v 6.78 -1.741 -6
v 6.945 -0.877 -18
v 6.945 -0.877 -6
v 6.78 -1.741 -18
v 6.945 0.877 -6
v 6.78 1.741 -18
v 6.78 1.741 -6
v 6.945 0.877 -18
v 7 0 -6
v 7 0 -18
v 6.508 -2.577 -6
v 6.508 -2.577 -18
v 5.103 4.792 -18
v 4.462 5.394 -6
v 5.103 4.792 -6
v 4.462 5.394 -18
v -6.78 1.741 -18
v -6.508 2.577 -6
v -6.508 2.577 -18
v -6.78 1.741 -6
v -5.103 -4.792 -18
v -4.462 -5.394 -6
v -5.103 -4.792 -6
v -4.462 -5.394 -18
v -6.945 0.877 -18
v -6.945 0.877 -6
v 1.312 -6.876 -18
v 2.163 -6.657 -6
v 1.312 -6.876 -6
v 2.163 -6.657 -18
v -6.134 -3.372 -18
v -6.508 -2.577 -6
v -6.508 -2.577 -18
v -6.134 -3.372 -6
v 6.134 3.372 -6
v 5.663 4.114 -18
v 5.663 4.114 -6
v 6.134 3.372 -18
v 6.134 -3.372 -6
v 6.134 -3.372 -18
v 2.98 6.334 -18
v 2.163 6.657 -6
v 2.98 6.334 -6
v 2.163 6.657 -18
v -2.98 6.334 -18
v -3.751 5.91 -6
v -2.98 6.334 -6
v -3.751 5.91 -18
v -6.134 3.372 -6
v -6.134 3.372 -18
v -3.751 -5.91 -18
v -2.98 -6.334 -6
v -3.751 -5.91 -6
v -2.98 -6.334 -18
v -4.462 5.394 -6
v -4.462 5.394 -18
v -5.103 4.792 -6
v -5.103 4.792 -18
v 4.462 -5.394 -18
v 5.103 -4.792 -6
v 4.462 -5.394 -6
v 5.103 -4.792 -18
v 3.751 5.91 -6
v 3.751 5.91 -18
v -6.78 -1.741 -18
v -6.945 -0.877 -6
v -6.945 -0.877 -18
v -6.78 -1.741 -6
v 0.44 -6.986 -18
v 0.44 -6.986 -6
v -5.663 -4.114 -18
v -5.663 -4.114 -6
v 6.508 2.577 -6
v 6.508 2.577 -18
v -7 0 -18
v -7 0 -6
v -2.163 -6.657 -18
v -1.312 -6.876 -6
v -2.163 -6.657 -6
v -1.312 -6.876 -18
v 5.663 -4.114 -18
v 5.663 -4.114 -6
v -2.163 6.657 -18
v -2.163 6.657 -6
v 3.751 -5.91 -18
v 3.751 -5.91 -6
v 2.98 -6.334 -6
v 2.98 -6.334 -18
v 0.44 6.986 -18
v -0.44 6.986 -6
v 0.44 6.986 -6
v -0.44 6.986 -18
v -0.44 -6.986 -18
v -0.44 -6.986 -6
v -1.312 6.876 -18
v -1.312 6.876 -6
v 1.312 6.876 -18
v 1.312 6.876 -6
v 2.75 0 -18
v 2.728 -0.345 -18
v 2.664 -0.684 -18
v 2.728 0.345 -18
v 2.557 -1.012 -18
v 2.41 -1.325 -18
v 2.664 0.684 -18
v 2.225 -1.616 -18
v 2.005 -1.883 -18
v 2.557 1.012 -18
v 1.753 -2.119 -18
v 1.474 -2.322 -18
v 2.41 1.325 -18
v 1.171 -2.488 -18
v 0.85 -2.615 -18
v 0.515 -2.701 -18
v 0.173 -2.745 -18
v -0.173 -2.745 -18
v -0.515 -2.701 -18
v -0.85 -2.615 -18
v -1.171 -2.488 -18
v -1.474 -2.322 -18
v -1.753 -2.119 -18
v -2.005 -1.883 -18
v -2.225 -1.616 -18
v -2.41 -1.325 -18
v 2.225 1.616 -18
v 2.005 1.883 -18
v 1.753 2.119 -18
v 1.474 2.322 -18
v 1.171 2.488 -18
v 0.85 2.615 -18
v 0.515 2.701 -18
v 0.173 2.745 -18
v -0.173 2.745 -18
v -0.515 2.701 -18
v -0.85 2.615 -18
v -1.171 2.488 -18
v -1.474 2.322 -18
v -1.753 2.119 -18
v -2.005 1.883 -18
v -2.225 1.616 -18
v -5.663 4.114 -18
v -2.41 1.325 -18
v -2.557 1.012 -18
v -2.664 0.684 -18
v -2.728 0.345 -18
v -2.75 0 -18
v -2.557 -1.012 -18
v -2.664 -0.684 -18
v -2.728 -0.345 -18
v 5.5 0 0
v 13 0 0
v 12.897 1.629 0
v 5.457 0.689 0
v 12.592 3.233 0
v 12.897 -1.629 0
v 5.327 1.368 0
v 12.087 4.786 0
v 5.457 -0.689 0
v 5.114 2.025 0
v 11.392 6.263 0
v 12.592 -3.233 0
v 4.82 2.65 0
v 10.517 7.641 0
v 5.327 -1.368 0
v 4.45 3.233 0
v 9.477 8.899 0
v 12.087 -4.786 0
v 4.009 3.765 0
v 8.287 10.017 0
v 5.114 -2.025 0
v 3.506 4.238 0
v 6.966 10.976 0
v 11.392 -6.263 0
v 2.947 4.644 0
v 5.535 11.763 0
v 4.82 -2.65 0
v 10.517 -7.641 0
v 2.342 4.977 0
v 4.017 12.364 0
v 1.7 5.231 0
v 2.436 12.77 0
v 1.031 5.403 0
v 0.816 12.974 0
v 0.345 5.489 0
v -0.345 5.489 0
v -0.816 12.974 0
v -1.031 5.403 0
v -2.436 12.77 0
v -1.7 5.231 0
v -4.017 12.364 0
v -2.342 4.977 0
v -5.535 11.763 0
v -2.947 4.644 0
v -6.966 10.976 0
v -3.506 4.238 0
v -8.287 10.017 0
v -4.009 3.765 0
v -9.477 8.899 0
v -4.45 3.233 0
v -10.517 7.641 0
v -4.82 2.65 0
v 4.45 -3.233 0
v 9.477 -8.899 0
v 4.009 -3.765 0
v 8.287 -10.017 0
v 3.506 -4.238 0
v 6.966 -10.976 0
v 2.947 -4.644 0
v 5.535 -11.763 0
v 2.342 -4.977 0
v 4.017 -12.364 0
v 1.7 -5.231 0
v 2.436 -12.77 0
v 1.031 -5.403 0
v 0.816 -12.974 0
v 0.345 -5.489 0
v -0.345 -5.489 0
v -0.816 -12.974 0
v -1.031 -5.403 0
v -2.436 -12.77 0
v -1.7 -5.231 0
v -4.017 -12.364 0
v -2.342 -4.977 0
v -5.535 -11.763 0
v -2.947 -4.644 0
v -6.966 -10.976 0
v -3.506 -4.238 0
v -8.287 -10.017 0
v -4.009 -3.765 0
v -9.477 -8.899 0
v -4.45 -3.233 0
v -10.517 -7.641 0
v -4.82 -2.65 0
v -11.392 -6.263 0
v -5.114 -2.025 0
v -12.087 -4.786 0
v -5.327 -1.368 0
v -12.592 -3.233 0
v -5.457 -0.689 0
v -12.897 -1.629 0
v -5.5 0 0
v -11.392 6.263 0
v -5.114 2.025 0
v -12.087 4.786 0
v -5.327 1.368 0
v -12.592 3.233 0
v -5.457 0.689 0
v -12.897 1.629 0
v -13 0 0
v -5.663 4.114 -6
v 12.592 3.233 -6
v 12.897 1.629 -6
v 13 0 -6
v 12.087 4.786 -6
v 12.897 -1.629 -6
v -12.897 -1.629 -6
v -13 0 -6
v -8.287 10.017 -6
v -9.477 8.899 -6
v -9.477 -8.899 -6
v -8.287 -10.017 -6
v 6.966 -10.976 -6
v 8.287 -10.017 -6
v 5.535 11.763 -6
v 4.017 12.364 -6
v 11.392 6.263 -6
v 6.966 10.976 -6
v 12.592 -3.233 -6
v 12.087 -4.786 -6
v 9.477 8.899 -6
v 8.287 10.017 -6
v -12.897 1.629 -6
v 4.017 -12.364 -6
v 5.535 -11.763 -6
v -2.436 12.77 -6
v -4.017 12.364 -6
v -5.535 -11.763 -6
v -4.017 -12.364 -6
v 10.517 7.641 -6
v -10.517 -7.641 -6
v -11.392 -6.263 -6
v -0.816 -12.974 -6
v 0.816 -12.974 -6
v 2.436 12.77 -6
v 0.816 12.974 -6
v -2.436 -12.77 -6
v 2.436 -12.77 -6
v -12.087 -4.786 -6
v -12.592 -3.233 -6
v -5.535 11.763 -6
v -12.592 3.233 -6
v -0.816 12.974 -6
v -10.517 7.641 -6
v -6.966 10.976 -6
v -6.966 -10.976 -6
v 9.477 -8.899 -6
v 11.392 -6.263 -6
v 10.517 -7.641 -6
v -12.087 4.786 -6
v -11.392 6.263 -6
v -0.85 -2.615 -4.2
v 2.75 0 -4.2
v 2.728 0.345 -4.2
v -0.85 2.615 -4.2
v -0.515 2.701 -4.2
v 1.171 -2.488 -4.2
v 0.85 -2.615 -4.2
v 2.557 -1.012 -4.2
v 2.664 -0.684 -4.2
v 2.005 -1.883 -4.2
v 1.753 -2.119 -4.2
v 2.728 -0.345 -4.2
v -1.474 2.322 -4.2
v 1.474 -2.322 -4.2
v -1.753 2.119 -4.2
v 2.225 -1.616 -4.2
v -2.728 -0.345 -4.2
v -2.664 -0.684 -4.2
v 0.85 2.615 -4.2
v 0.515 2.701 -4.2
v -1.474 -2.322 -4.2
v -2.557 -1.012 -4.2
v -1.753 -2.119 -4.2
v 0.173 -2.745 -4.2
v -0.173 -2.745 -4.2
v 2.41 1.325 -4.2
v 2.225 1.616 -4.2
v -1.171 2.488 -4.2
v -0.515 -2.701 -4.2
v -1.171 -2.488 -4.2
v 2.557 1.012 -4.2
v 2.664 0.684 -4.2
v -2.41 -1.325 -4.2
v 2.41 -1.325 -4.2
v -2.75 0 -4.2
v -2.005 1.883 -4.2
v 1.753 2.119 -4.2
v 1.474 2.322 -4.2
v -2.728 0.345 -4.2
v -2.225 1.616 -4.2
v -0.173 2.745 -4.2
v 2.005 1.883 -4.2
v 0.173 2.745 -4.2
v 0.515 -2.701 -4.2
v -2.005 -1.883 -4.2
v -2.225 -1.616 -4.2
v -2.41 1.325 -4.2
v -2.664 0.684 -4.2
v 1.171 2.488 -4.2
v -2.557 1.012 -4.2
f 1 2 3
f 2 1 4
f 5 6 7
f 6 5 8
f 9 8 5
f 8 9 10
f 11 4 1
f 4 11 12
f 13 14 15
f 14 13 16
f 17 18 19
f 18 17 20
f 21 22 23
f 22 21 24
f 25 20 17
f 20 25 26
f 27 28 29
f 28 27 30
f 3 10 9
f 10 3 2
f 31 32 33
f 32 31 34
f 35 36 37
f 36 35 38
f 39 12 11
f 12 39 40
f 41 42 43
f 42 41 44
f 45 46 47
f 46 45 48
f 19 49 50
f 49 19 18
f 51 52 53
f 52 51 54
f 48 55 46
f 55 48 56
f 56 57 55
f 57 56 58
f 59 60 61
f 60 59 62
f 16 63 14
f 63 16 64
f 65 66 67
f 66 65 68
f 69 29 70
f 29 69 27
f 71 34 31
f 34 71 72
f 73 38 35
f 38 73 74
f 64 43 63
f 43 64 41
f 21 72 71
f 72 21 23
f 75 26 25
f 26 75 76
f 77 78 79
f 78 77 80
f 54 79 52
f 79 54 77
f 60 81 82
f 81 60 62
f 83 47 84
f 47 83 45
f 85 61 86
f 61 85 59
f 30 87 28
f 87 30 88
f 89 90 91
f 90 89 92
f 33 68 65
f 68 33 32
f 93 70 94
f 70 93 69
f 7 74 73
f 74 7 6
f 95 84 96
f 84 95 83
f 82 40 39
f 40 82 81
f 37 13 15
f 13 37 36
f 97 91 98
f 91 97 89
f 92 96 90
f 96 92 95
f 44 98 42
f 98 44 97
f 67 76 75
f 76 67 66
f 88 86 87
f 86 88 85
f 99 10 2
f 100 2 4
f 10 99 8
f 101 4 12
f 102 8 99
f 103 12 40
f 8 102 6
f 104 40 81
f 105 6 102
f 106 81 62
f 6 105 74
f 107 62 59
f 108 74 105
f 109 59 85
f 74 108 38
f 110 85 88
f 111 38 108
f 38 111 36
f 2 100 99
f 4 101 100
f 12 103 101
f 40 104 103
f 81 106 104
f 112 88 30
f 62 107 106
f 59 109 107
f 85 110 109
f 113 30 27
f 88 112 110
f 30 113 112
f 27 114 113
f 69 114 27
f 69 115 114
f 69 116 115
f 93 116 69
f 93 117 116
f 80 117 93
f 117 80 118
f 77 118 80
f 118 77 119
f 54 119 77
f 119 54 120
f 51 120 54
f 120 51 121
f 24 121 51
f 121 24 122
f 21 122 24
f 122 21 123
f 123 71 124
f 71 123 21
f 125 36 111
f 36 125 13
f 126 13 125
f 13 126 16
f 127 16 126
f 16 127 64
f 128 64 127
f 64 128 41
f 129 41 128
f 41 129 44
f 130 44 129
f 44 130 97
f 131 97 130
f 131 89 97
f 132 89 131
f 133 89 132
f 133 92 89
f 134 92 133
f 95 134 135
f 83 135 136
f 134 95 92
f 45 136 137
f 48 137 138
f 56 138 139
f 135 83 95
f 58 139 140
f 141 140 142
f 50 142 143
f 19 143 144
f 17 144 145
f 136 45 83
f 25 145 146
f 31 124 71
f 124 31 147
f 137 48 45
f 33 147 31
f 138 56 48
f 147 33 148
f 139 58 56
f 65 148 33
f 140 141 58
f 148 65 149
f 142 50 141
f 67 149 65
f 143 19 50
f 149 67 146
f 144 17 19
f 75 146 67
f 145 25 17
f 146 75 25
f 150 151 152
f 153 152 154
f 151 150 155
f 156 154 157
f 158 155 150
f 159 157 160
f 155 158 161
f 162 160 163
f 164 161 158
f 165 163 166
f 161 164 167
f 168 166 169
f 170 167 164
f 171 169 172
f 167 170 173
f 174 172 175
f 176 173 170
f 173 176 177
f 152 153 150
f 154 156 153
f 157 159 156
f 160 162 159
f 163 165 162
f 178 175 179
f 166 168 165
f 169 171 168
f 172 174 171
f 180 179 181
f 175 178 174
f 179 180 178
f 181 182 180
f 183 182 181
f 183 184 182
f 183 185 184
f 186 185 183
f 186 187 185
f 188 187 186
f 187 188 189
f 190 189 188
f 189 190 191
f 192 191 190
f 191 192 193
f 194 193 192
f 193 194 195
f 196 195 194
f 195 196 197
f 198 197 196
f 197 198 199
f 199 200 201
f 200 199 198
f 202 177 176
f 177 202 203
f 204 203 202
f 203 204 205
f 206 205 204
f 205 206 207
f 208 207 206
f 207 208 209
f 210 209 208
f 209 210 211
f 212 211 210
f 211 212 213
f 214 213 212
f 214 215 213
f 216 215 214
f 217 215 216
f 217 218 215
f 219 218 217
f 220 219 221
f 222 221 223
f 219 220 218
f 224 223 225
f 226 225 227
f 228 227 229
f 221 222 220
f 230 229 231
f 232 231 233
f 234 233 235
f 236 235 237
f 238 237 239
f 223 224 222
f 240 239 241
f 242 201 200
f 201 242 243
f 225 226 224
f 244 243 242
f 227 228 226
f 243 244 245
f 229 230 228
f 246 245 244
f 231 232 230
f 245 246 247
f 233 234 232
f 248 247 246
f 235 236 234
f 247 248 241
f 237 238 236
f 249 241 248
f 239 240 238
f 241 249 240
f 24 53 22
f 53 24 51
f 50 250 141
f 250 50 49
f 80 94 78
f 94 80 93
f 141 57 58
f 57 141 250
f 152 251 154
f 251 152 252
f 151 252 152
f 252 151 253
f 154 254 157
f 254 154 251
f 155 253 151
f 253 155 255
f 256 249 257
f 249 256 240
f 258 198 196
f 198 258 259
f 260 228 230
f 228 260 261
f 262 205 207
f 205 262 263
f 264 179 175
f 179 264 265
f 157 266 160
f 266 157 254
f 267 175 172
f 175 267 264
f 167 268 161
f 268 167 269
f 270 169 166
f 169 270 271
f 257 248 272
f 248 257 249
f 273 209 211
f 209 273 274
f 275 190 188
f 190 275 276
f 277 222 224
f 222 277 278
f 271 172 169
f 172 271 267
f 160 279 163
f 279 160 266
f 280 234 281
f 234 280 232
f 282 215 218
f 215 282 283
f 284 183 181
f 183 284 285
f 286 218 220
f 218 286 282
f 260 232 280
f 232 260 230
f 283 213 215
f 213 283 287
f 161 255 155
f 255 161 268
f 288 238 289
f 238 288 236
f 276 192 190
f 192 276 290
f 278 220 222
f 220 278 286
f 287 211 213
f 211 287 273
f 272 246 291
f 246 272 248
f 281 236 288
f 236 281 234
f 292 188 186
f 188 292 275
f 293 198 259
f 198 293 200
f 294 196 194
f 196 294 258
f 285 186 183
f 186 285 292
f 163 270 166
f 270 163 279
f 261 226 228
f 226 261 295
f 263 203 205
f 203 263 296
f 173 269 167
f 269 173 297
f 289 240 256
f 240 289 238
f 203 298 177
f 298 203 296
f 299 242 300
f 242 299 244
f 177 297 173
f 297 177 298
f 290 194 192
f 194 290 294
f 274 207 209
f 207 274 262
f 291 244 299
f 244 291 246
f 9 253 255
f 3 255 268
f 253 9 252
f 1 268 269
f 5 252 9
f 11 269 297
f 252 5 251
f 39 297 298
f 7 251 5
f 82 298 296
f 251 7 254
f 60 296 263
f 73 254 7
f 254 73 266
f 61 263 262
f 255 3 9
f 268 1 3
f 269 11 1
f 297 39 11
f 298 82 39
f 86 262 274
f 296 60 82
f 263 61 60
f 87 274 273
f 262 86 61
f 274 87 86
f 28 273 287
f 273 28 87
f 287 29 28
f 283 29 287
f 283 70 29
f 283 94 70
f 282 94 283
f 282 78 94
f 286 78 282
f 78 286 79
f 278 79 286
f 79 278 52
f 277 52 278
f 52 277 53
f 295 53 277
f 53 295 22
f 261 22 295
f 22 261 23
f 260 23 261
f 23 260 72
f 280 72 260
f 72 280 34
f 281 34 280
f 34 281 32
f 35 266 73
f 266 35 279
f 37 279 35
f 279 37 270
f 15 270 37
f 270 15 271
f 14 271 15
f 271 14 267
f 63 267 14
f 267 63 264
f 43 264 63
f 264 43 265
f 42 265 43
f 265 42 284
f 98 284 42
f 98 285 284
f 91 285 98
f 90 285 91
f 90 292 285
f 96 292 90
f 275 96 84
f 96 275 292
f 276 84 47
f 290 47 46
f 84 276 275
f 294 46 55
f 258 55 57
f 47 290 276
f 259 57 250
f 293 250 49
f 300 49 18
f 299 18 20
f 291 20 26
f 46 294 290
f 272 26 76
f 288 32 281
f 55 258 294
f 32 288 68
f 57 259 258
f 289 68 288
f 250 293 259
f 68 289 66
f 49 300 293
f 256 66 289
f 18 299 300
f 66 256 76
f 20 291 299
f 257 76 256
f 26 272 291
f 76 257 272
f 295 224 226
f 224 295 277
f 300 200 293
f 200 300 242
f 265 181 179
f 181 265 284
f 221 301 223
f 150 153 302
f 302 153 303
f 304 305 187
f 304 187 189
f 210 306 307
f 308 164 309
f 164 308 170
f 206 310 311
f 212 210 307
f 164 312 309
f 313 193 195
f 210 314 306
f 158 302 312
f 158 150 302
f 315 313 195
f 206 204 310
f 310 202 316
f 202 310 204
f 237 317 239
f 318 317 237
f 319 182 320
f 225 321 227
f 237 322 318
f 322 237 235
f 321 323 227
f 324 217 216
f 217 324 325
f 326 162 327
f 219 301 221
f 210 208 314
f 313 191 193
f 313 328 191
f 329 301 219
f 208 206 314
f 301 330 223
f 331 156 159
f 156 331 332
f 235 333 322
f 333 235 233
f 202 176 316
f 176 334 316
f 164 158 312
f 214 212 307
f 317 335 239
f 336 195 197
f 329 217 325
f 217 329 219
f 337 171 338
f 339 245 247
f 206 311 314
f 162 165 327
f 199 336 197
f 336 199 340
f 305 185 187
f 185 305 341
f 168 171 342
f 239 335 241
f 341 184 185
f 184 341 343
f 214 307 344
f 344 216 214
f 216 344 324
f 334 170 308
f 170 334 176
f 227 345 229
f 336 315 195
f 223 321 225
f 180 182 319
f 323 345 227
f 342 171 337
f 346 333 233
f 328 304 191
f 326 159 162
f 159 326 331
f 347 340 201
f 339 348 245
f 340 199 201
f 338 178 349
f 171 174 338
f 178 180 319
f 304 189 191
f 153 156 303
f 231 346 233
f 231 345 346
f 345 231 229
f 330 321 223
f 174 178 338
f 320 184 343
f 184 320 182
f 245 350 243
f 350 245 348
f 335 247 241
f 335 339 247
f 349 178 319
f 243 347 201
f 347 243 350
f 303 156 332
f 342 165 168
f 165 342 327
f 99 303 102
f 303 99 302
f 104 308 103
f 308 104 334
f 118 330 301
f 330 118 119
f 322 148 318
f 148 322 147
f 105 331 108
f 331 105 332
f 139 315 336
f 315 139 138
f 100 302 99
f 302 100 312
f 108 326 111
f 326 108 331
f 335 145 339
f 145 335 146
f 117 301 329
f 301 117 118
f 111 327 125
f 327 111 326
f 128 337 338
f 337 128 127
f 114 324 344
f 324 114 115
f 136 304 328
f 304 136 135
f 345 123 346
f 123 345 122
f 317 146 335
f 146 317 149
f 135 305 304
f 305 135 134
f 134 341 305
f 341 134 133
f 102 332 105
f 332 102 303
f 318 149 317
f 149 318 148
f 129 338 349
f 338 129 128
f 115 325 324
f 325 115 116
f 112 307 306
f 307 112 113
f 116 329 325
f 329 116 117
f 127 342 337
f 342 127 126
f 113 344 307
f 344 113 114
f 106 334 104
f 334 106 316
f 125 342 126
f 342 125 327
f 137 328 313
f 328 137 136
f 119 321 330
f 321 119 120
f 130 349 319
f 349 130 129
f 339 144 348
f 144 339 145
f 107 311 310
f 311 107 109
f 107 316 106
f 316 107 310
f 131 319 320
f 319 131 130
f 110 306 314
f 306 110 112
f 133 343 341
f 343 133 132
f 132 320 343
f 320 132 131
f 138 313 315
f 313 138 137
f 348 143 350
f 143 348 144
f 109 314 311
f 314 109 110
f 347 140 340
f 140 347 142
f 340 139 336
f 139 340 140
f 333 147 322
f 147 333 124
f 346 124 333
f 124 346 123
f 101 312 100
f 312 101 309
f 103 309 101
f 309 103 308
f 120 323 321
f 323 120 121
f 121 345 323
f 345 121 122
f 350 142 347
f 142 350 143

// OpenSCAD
$fn = 50;


difference() {
	union() {
		translate(v = [0, 0, -18.0000000000]) {
			cylinder(h = 18, r = 7.0000000000);
		}
		translate(v = [0, 0, -6.0000000000]) {
			cylinder(h = 6, r = 13.0000000000);
		}
	}
	union() {
		translate(v = [0, 0, 0]) {
			rotate(a = [0, 0, 0]) {
				difference() {
					union() {
						#translate(v = [0, 0, -18.0000000000]) {
							cylinder(h = 18, r = 2.2500000000);
						}
						#translate(v = [0, 0, -4.2000000000]) {
							cylinder(h = 4.2000000000, r1 = 2.7500000000, r2 = 5.5000000000);
						}
						#translate(v = [0, 0, -18.0000000000]) {
							cylinder(h = 18, r = 2.7500000000);
						}
						#translate(v = [0, 0, -18.0000000000]) {
							cylinder(h = 18, r = 2.2500000000);
						}
					}
					union();
				}
			}
		}
	}
}
